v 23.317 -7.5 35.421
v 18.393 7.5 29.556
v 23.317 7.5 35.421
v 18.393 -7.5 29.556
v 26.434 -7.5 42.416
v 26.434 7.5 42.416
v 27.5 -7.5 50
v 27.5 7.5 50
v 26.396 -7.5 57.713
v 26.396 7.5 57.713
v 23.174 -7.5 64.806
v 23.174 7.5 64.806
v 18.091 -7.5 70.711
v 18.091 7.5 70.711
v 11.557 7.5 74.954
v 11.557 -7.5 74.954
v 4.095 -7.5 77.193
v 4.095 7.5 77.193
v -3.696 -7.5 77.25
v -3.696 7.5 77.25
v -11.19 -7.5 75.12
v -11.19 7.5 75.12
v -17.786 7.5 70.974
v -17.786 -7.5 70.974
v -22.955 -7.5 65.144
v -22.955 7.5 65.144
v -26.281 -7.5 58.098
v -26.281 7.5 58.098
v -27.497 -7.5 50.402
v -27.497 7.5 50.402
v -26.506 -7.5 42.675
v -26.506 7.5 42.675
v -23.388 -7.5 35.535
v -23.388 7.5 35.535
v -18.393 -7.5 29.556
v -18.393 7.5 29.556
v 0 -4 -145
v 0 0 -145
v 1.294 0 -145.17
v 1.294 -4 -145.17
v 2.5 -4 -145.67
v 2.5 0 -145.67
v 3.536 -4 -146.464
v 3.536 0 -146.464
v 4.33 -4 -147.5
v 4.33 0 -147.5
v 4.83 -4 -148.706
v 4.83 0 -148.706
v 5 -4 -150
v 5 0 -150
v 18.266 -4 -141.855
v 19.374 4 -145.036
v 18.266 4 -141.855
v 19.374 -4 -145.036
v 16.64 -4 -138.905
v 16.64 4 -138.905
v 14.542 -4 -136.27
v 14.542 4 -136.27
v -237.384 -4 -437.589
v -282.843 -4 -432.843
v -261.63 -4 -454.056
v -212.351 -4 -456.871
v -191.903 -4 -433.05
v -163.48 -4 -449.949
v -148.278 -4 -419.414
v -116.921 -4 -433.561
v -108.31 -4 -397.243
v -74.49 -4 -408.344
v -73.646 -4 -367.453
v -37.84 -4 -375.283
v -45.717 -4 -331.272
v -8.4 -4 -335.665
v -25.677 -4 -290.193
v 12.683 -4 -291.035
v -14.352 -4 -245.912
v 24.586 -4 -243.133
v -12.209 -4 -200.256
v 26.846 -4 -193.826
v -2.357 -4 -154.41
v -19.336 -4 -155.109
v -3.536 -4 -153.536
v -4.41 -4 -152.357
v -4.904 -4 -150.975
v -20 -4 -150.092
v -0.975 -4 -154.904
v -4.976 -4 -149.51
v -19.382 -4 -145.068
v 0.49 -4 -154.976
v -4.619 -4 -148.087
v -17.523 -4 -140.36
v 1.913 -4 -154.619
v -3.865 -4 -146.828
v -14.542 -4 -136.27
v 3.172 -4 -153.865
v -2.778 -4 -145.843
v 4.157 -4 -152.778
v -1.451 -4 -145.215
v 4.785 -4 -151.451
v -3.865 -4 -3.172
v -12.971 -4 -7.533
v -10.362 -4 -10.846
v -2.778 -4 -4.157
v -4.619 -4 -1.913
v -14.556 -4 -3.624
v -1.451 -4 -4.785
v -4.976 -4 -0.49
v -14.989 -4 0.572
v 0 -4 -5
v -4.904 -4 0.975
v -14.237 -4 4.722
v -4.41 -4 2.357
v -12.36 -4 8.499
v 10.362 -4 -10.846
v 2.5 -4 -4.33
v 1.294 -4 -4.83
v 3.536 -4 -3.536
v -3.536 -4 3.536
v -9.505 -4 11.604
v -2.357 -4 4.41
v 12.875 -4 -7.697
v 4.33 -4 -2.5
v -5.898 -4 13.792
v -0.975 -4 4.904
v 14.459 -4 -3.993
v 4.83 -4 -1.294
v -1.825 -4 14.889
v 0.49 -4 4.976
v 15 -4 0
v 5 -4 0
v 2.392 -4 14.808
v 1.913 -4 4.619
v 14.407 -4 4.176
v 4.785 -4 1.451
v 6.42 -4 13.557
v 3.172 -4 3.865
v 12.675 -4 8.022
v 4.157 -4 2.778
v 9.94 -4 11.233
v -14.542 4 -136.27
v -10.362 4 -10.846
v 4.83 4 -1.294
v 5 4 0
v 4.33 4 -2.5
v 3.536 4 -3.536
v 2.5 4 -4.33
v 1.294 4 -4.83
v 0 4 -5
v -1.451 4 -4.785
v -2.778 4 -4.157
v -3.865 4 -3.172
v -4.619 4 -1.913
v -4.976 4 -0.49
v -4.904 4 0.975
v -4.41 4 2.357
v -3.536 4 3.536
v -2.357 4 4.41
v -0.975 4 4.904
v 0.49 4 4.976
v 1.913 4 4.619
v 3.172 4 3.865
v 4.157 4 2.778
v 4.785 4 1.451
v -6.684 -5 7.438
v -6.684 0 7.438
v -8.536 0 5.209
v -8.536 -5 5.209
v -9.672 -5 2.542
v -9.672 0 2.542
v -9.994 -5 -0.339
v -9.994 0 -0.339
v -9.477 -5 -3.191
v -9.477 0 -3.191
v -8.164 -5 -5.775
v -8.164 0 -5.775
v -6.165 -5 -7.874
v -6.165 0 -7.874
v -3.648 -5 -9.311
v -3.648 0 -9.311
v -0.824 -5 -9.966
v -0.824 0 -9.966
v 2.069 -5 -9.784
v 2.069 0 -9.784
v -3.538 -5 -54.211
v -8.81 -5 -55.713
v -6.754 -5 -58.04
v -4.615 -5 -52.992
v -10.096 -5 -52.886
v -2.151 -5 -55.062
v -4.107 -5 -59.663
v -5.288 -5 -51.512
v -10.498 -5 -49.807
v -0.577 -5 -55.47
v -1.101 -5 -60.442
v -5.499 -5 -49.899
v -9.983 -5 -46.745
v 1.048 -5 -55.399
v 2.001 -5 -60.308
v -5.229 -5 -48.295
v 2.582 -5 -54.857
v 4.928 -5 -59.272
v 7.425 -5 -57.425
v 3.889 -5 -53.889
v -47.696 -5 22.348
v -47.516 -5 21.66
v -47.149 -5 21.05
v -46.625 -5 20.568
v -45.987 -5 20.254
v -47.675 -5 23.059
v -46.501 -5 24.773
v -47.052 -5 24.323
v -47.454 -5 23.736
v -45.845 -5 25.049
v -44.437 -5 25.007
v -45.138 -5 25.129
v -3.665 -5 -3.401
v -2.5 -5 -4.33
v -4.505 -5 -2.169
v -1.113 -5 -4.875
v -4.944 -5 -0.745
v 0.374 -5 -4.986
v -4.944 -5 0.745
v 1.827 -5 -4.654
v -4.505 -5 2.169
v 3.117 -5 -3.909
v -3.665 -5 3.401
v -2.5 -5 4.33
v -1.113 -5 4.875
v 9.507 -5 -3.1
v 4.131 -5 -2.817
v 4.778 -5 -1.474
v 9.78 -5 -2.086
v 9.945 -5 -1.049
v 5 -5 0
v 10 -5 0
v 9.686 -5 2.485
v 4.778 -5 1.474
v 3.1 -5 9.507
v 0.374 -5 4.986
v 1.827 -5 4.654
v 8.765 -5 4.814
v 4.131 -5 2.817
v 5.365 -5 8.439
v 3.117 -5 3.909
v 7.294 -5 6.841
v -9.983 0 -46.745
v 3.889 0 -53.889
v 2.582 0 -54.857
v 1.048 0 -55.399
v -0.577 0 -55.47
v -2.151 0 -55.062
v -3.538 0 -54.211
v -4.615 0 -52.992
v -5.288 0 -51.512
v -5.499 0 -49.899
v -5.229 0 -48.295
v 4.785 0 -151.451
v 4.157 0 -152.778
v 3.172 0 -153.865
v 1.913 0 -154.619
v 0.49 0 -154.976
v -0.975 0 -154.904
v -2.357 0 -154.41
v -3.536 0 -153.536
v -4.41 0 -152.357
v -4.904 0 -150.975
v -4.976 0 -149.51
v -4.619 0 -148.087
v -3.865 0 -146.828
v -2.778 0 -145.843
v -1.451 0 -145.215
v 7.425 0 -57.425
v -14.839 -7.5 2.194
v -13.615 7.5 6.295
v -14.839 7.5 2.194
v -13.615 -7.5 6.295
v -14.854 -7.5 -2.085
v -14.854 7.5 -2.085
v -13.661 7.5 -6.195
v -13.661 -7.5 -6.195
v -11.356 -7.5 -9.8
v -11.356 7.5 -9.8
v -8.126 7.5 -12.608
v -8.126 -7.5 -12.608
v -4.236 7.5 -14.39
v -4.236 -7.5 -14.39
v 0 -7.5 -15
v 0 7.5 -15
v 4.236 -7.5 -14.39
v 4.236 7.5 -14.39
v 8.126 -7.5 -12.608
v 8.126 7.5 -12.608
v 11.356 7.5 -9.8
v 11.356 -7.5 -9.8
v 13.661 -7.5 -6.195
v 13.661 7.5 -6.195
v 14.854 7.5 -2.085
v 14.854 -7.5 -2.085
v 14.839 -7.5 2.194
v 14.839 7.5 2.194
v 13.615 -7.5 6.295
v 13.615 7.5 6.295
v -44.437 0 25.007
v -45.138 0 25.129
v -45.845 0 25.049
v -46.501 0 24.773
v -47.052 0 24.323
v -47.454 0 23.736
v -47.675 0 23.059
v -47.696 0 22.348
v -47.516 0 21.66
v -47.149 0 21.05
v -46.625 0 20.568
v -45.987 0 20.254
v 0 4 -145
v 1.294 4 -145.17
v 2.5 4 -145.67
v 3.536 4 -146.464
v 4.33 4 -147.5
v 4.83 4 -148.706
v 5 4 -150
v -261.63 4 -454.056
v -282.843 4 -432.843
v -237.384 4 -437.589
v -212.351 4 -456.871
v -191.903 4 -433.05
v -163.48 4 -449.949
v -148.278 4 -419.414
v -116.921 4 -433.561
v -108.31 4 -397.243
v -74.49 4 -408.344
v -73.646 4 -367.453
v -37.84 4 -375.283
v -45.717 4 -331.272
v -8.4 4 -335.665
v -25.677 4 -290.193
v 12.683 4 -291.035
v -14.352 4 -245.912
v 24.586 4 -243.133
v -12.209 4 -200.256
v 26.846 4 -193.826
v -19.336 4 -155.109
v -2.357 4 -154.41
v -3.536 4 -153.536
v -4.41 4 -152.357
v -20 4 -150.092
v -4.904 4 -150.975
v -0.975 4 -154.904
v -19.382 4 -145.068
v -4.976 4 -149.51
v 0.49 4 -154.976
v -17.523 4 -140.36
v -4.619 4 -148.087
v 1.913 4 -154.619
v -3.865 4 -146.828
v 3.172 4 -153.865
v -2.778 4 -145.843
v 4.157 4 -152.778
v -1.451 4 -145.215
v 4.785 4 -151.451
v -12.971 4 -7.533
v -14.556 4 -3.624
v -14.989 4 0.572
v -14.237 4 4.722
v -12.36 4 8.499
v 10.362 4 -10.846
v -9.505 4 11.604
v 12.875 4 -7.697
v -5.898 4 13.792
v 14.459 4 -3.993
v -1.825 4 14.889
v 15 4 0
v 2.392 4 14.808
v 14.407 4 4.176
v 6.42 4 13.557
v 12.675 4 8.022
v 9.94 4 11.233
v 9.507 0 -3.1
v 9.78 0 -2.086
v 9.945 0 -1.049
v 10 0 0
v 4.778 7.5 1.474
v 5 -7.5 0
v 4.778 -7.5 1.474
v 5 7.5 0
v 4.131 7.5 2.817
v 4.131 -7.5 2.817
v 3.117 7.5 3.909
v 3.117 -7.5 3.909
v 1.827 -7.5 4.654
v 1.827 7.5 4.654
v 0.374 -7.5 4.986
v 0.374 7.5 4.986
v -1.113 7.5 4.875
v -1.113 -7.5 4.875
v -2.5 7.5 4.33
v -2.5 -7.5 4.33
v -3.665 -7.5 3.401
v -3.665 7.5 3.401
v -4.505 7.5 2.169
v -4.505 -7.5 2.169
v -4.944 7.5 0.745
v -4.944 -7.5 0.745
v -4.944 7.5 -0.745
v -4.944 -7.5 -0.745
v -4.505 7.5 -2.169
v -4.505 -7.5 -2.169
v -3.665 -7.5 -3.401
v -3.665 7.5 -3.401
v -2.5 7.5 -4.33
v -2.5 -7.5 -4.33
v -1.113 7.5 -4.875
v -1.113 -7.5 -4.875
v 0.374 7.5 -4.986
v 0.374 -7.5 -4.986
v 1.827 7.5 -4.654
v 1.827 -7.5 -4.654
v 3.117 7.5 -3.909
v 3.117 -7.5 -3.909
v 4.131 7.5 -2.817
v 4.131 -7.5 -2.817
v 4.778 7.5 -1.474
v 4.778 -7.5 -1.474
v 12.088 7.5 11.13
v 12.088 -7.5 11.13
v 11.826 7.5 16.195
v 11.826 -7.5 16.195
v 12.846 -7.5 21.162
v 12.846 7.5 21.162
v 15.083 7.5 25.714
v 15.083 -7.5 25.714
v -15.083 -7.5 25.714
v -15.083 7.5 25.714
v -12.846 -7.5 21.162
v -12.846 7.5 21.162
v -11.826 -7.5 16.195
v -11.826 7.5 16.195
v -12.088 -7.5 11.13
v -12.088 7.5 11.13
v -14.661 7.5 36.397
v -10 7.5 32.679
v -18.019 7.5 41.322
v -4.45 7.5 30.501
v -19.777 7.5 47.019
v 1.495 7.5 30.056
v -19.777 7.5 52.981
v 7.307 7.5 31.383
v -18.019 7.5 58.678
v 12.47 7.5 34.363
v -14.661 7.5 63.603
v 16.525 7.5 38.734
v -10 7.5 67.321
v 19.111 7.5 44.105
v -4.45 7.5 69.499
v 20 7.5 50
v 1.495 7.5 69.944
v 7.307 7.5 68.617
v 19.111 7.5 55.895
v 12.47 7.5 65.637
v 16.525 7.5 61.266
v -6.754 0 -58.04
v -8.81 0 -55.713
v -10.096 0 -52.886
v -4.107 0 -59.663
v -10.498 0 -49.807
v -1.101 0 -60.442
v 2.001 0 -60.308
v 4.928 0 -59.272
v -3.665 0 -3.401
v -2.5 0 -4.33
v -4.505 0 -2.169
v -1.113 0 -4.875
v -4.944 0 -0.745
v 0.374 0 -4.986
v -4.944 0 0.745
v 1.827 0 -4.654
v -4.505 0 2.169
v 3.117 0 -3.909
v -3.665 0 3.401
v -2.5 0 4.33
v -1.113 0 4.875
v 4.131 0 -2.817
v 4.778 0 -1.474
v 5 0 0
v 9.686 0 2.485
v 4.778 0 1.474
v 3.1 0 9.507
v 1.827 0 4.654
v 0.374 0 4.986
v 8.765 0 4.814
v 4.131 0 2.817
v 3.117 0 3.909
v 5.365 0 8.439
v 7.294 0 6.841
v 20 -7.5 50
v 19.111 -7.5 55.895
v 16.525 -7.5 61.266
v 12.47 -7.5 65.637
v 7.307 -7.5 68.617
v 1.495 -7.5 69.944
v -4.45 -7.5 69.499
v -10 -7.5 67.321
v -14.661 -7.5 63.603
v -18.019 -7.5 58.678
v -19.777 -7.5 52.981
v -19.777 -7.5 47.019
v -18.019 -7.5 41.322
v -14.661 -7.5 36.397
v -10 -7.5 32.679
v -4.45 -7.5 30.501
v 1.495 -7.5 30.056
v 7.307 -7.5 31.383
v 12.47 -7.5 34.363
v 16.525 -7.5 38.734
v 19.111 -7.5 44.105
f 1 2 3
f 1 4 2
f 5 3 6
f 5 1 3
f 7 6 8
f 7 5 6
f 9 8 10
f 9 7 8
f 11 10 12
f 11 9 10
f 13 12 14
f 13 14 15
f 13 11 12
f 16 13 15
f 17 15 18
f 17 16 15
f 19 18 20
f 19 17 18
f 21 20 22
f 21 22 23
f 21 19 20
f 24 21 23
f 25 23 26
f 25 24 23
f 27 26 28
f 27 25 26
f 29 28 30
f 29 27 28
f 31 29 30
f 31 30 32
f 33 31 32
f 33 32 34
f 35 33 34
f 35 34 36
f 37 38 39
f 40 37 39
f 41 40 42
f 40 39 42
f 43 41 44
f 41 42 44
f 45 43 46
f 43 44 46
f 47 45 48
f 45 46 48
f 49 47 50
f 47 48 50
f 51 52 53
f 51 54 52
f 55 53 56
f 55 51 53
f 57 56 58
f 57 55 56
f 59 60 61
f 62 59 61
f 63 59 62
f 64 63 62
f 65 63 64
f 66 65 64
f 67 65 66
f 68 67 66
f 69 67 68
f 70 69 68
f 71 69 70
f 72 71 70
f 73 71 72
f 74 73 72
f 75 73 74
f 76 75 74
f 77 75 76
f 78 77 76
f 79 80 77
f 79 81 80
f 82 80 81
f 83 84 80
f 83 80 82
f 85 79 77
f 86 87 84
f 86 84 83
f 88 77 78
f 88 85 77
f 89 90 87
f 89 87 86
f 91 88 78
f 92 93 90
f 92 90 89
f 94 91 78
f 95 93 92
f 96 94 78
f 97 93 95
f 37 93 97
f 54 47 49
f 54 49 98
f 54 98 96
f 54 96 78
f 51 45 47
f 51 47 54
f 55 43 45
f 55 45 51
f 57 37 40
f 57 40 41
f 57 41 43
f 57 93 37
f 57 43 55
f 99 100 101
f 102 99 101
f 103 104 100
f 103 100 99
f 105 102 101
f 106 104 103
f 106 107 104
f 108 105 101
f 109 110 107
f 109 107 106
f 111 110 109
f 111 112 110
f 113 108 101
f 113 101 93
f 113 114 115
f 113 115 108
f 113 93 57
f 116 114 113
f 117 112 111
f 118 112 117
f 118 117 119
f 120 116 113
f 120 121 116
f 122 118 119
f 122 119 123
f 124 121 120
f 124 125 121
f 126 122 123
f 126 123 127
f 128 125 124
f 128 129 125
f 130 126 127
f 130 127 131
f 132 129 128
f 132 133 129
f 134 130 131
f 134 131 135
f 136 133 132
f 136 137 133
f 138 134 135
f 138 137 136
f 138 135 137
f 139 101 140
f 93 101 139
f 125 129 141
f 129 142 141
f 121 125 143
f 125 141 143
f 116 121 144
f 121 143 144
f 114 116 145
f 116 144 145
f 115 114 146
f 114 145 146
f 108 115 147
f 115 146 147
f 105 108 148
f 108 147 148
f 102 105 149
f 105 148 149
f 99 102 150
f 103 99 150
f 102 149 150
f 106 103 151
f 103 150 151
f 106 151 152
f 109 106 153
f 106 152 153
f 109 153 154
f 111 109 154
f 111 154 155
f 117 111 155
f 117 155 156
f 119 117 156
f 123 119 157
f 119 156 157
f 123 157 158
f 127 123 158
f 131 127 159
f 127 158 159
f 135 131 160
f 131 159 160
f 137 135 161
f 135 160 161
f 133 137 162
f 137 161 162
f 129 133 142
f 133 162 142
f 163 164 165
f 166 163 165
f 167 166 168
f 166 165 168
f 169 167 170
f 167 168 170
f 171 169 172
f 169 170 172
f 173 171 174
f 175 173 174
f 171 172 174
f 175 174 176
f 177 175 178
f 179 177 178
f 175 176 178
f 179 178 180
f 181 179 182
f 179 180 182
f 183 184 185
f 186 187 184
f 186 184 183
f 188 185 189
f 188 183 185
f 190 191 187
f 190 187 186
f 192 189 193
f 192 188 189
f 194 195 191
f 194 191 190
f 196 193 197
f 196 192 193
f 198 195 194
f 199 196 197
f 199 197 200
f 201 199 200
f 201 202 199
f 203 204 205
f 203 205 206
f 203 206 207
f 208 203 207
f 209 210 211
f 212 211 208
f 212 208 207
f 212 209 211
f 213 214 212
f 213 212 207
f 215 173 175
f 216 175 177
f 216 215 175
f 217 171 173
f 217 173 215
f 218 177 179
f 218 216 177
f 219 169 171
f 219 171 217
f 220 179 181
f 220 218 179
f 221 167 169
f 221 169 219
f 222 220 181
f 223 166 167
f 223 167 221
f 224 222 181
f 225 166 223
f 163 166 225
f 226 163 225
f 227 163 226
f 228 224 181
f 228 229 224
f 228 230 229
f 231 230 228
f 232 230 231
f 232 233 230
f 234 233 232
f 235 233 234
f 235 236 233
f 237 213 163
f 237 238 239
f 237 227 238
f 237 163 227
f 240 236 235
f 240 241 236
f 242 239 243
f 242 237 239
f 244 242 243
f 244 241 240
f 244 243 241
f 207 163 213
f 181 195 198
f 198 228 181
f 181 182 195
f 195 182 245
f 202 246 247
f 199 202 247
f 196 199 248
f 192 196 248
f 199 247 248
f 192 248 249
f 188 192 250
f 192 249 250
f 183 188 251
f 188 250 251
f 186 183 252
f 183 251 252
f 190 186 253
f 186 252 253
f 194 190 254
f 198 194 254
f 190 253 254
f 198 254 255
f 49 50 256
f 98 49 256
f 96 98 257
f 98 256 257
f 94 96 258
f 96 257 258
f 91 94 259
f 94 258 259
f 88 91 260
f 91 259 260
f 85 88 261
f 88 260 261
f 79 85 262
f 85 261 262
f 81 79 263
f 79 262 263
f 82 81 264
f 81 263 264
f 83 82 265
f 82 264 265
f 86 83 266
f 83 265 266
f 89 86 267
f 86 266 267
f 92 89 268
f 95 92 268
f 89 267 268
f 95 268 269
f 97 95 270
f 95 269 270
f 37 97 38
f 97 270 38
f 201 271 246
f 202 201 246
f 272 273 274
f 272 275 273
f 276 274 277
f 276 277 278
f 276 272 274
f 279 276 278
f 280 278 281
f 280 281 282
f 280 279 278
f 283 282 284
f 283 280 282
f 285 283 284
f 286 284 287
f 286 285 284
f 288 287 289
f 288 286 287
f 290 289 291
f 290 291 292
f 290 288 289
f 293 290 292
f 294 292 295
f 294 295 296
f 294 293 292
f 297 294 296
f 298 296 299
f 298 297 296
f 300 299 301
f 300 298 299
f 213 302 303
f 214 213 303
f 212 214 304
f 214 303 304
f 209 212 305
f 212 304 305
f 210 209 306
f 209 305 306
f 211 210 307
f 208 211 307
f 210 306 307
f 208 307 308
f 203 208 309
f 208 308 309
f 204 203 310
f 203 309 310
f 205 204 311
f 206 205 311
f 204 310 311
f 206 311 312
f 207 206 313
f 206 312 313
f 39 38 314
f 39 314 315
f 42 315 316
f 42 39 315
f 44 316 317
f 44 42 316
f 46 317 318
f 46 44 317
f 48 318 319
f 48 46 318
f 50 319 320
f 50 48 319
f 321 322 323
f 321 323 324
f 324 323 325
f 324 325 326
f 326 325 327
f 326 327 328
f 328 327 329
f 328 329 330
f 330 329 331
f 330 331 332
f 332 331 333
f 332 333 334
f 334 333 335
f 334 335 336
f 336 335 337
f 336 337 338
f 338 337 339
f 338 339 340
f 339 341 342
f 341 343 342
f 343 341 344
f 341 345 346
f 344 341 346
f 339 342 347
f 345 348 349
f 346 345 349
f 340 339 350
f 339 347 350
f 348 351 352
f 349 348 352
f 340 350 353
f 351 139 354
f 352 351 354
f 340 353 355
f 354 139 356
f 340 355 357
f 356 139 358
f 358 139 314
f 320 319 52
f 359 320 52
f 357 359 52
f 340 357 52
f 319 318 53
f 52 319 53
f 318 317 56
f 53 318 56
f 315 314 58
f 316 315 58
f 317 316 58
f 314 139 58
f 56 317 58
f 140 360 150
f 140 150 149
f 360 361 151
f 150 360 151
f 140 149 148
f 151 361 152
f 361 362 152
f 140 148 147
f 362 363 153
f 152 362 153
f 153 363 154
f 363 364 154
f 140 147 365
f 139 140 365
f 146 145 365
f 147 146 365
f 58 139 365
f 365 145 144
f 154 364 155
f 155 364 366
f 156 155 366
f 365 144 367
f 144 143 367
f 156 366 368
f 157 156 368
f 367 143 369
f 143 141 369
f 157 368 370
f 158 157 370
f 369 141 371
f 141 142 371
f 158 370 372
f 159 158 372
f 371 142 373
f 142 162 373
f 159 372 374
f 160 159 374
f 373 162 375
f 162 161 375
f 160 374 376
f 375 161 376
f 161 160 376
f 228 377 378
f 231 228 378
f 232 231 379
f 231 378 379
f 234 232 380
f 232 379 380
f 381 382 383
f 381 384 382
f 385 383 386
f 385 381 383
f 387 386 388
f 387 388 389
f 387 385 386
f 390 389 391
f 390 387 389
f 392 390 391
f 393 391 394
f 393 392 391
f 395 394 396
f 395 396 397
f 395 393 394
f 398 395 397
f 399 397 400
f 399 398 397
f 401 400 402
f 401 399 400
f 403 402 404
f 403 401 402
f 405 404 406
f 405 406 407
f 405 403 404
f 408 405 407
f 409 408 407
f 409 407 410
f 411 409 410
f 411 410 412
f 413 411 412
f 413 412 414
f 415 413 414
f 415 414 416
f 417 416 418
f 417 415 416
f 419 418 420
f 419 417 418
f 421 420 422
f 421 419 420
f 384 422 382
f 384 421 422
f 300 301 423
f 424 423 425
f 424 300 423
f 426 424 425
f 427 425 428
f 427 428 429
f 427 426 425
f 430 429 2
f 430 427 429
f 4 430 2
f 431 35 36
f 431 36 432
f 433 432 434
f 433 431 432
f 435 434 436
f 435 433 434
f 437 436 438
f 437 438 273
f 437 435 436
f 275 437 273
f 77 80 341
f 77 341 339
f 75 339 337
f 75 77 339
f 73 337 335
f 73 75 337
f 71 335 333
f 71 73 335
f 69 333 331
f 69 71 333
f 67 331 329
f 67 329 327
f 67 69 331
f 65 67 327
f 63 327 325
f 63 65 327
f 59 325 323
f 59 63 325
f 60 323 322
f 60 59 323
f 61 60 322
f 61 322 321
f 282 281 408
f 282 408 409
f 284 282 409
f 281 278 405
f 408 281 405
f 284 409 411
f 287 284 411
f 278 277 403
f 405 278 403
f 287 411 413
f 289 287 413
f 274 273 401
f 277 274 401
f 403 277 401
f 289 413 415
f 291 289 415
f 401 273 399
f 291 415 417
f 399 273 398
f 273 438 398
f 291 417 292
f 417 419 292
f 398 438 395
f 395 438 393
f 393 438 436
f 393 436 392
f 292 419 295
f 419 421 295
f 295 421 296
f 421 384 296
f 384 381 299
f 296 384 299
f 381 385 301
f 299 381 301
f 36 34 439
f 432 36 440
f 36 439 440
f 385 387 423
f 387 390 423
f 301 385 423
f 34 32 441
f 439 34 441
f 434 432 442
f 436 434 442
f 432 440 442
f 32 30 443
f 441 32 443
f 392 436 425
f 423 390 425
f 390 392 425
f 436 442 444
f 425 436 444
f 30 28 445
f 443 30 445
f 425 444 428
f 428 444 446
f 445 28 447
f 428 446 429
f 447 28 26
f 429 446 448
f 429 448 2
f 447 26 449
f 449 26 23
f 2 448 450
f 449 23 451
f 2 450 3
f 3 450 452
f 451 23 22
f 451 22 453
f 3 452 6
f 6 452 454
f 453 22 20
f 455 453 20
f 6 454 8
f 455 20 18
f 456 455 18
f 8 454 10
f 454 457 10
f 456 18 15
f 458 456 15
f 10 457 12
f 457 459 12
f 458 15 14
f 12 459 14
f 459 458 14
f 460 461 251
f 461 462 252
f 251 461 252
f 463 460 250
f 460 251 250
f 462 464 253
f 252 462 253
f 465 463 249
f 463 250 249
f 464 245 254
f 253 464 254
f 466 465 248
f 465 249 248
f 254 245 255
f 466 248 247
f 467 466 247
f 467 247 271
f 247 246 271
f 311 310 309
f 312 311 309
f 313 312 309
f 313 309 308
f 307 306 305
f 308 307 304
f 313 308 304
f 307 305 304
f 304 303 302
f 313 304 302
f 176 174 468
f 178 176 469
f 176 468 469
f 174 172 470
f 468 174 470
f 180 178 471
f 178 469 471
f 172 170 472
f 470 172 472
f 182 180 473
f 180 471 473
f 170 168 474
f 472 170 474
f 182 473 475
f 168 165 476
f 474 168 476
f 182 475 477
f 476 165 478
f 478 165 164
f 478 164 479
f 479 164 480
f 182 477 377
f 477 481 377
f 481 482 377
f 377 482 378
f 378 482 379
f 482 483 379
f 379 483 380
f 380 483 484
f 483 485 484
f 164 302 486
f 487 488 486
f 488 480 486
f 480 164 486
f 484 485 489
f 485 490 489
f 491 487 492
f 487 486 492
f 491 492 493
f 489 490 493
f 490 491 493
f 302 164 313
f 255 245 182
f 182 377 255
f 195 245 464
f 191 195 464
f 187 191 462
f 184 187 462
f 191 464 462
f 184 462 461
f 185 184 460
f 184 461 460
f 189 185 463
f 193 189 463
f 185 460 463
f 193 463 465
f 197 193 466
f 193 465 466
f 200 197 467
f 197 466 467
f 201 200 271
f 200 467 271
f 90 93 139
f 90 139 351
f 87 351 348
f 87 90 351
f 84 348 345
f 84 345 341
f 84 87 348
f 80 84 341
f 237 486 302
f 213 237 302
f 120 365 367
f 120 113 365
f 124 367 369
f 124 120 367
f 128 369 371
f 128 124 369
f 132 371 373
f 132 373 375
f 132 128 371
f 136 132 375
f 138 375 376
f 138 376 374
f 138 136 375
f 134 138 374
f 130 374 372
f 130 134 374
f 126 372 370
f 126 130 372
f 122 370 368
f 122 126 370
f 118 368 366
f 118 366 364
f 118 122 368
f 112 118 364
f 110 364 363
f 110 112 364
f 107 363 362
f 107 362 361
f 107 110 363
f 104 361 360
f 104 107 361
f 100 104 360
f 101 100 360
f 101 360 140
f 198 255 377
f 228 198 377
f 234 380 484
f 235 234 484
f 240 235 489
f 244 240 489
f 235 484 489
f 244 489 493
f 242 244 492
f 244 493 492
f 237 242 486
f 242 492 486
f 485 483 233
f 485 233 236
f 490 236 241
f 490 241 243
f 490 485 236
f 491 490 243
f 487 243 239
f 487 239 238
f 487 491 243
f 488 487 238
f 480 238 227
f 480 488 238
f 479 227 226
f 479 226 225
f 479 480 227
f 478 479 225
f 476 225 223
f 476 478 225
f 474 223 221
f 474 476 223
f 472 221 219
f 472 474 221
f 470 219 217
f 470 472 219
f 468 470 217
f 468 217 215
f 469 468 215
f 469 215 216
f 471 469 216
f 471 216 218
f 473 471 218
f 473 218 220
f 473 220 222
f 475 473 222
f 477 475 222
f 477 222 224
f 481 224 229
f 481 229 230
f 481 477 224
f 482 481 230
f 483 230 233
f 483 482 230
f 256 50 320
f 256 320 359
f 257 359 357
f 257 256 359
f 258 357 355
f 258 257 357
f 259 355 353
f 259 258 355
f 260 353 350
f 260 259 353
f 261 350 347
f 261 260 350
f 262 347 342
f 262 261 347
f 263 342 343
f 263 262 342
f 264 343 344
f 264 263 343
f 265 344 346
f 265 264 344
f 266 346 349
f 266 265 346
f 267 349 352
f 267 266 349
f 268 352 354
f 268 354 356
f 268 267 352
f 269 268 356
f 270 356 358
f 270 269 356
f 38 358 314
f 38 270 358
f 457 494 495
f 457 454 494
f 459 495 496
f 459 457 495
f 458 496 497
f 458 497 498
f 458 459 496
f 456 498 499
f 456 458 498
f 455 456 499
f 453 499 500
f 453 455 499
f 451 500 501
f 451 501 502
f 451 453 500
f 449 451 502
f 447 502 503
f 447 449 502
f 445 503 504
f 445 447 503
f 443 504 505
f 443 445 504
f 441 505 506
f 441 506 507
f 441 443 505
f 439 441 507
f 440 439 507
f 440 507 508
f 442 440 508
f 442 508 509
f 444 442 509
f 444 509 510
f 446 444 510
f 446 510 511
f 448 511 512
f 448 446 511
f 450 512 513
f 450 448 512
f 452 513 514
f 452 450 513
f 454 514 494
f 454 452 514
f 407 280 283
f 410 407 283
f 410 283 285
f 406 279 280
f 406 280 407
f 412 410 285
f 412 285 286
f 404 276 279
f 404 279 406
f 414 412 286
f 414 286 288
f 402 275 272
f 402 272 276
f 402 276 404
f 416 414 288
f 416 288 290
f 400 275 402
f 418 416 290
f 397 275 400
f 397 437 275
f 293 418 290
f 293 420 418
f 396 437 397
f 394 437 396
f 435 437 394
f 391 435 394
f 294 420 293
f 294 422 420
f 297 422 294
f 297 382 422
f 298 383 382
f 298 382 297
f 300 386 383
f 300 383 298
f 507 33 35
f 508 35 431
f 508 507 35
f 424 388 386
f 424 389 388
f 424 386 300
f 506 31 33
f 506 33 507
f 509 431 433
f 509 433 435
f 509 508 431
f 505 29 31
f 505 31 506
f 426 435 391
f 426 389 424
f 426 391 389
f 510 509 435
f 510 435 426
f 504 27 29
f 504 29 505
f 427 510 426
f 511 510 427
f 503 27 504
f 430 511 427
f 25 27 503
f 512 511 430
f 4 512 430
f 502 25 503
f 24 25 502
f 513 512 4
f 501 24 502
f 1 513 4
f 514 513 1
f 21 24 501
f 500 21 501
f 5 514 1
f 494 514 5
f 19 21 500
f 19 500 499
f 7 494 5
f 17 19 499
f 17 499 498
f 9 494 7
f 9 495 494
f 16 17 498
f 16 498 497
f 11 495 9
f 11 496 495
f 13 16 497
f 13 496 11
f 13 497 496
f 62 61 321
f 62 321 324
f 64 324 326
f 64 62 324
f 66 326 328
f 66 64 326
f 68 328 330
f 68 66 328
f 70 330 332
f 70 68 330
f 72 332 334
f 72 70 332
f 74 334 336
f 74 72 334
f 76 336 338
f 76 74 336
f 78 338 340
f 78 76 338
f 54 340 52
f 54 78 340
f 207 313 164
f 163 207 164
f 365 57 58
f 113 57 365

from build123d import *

# Parameters (mm, degrees)
F1_DEPTH = 4
F3_R     = 20
F3_R_2   = 5
F4_DEPTH = 7.5
F5_R     = 5
F6_DEPTH = 5


with BuildPart() as f1:
    # F0 (on Front) → F1 (new body, symmetric)
    with BuildSketch(Plane.XZ):
        with BuildLine():
            ThreePointArc((10.3615376685, -10.8461300539), (13.7917197083, -5.8981749284), (15, 0))
            ThreePointArc((15, 0), (-5.8981749284, 13.7917197083), (-10.3615376685, -10.8461300539))
            ThreePointArc((-10.3615376685, -10.8461300539), (-5.5815790415, -13.9228580185), (0, -15))
            ThreePointArc((0, -15), (5.5815790415, -13.9228580185), (10.3615376685, -10.8461300539))
        make_face()
        with BuildLine():
            ThreePointArc((5, 0), (3.5355339059, -3.5355339059), (0, -5))
            ThreePointArc((0, -5), (-3.5355339059, 3.5355339059), (5, 0))
        make_face(mode=Mode.SUBTRACT)
        with BuildLine():
            ThreePointArc((0, -15), (-5.5815790415, -13.9228580185), (-10.3615376685, -10.8461300539))
            Line((-10.3615376685, -10.8461300539), (-14.5423237184, -136.2697115518))
            ThreePointArc((-14.5423237184, -136.2697115518), (-7.9181510164, -131.6341925176), (0, -130))
            Line((0, -130), (0, -15))
        make_face()
        with BuildLine():
            Line((14.5423237184, -136.2697115518), (10.3615376685, -10.8461300539))
            ThreePointArc((10.3615376685, -10.8461300539), (5.5815790415, -13.9228580185), (0, -15))
            Line((0, -15), (0, -130))
            ThreePointArc((0, -130), (7.9181510164, -131.6341925176), (14.5423237184, -136.2697115518))
        make_face()
        with BuildLine():
            ThreePointArc((0, -130), (-7.9181510164, -131.6341925176), (-14.5423237184, -136.2697115518))
            ThreePointArc((-14.5423237184, -136.2697115518), (-19.3823141099, -145.0678706683), (-19.3363569345, -155.1093346436))
            ThreePointArc((-19.3363569345, -155.1093346436), (2.5761270649, -169.8333953055), (20, -150))
            ThreePointArc((20, -150), (19.8429078923, -147.4981993729), (19.3740993622, -145.0357000592))
            ThreePointArc((19.3740993622, -145.0357000592), (17.5154668015, -140.3455490717), (14.5423237184, -136.2697115518))
            ThreePointArc((14.5423237184, -136.2697115518), (7.9181510164, -131.6341925176), (0, -130))
        make_face()
        with BuildLine():
            ThreePointArc((5, -150), (-3.5355339059, -153.5355339059), (0, -145))
            ThreePointArc((0, -145), (3.5355339059, -146.4644660941), (5, -150))
        make_face(mode=Mode.SUBTRACT)
        with BuildLine():
            ThreePointArc((20, -150), (2.5761270649, -169.8333953055), (-19.3363569345, -155.1093346436))
            ThreePointArc((-19.3363569345, -155.1093346436), (-73.6456518499, -367.4528072618), (-282.8427124746, -432.8427124746))
            Line((-282.8427124746, -432.8427124746), (-261.629509039, -454.0559159102))
            ThreePointArc((-261.629509039, -454.0559159102), (-37.8398093147, -375.282597935), (19.3740993622, -145.0357000592))
            ThreePointArc((19.3740993622, -145.0357000592), (19.8429078923, -147.4981993729), (20, -150))
        make_face()
    extrude(amount=F1_DEPTH, both=True)


with BuildPart() as f4:
    # F3 (on Front) → F4 (new body, symmetric)
    with BuildSketch(Plane.XZ):
        with BuildLine():
            ThreePointArc((18.3926516847, 29.5559210526), (25.1201902991, 38.8095558919), (27.5, 50))
            ThreePointArc((27.5, 50), (-11.1904441081, 75.1201902991), (-18.3926516847, 29.5559210526))
            ThreePointArc((-18.3926516847, 29.5559210526), (0, 22.5), (18.3926516847, 29.5559210526))
        make_face()
        with Locations((0, 50)):
            Circle(F3_R, mode=Mode.SUBTRACT)
        with BuildLine():
            ThreePointArc((18.3926516847, 29.5559210526), (0, 22.5), (-18.3926516847, 29.5559210526))
            ThreePointArc((-18.3926516847, 29.5559210526), (-12.1780284186, 18.7110444293), (-13.6153395588, 6.2946428571))
            ThreePointArc((-13.6153395588, 6.2946428571), (0, -15), (13.6153395588, 6.2946428571))
            ThreePointArc((13.6153395588, 6.2946428571), (12.1780284186, 18.7110444293), (18.3926516847, 29.5559210526))
        make_face()
        Circle(F3_R_2, mode=Mode.SUBTRACT)
    extrude(amount=F4_DEPTH, both=True)


with BuildPart() as f6:
    # F5 (on Front) → F6 (new body)
    with BuildSketch(Plane.XZ):
        with BuildLine():
            ThreePointArc((9.5073655657, -3.1), (9.8760735026, -1.5694496397), (10, 0))
            ThreePointArc((10, 0), (8.0932070281, 5.8736700622), (3.1, 9.5073655657))
            ThreePointArc((3.1, 9.5073655657), (-2.0690041895, 9.7836200695), (-6.6836203438, 7.4383613181))
            ThreePointArc((-6.6836203438, 7.4383613181), (-8.914753611, -4.5306917854), (2.0690040311, -9.783620103))
            ThreePointArc((2.0690040311, -9.783620103), (6.683620103, -7.4383615346), (9.5073655657, -3.1))
        make_face()
        Circle(F5_R, mode=Mode.SUBTRACT)
        with BuildLine():
            ThreePointArc((-6.6836203438, 7.4383613181), (-2.0690041895, 9.7836200695), (3.1, 9.5073655657))
            Line((3.1, 9.5073655657), (-44.4368278285, 25.0073655657))
            ThreePointArc((-44.4368278285, 25.0073655657), (-47.5886693968, 23.4055240844), (-45.9868279155, 20.2536825162))
            Line((-45.9868279155, 20.2536825162), (-6.6836203438, 7.4383613181))
        make_face()
        with BuildLine():
            Line((-5.2290510611, -48.295), (9.5073655657, -3.1))
            ThreePointArc((9.5073655657, -3.1), (6.683620103, -7.4383615346), (2.0690040311, -9.783620103))
            Line((2.0690040311, -9.783620103), (-9.982733844, -46.745))
            ThreePointArc((-9.982733844, -46.745), (-5.4908617109, -58.9498847854), (7.4246212025, -57.4246212025))
            Line((7.4246212025, -57.4246212025), (3.8890872965, -53.8890872965))
            ThreePointArc((3.8890872965, -53.8890872965), (-2.8761656581, -54.6880348876), (-5.2290510611, -48.295))
        make_face()
    extrude(amount=F6_DEPTH)


solid = Compound([f1.part, f4.part, f6.part])
